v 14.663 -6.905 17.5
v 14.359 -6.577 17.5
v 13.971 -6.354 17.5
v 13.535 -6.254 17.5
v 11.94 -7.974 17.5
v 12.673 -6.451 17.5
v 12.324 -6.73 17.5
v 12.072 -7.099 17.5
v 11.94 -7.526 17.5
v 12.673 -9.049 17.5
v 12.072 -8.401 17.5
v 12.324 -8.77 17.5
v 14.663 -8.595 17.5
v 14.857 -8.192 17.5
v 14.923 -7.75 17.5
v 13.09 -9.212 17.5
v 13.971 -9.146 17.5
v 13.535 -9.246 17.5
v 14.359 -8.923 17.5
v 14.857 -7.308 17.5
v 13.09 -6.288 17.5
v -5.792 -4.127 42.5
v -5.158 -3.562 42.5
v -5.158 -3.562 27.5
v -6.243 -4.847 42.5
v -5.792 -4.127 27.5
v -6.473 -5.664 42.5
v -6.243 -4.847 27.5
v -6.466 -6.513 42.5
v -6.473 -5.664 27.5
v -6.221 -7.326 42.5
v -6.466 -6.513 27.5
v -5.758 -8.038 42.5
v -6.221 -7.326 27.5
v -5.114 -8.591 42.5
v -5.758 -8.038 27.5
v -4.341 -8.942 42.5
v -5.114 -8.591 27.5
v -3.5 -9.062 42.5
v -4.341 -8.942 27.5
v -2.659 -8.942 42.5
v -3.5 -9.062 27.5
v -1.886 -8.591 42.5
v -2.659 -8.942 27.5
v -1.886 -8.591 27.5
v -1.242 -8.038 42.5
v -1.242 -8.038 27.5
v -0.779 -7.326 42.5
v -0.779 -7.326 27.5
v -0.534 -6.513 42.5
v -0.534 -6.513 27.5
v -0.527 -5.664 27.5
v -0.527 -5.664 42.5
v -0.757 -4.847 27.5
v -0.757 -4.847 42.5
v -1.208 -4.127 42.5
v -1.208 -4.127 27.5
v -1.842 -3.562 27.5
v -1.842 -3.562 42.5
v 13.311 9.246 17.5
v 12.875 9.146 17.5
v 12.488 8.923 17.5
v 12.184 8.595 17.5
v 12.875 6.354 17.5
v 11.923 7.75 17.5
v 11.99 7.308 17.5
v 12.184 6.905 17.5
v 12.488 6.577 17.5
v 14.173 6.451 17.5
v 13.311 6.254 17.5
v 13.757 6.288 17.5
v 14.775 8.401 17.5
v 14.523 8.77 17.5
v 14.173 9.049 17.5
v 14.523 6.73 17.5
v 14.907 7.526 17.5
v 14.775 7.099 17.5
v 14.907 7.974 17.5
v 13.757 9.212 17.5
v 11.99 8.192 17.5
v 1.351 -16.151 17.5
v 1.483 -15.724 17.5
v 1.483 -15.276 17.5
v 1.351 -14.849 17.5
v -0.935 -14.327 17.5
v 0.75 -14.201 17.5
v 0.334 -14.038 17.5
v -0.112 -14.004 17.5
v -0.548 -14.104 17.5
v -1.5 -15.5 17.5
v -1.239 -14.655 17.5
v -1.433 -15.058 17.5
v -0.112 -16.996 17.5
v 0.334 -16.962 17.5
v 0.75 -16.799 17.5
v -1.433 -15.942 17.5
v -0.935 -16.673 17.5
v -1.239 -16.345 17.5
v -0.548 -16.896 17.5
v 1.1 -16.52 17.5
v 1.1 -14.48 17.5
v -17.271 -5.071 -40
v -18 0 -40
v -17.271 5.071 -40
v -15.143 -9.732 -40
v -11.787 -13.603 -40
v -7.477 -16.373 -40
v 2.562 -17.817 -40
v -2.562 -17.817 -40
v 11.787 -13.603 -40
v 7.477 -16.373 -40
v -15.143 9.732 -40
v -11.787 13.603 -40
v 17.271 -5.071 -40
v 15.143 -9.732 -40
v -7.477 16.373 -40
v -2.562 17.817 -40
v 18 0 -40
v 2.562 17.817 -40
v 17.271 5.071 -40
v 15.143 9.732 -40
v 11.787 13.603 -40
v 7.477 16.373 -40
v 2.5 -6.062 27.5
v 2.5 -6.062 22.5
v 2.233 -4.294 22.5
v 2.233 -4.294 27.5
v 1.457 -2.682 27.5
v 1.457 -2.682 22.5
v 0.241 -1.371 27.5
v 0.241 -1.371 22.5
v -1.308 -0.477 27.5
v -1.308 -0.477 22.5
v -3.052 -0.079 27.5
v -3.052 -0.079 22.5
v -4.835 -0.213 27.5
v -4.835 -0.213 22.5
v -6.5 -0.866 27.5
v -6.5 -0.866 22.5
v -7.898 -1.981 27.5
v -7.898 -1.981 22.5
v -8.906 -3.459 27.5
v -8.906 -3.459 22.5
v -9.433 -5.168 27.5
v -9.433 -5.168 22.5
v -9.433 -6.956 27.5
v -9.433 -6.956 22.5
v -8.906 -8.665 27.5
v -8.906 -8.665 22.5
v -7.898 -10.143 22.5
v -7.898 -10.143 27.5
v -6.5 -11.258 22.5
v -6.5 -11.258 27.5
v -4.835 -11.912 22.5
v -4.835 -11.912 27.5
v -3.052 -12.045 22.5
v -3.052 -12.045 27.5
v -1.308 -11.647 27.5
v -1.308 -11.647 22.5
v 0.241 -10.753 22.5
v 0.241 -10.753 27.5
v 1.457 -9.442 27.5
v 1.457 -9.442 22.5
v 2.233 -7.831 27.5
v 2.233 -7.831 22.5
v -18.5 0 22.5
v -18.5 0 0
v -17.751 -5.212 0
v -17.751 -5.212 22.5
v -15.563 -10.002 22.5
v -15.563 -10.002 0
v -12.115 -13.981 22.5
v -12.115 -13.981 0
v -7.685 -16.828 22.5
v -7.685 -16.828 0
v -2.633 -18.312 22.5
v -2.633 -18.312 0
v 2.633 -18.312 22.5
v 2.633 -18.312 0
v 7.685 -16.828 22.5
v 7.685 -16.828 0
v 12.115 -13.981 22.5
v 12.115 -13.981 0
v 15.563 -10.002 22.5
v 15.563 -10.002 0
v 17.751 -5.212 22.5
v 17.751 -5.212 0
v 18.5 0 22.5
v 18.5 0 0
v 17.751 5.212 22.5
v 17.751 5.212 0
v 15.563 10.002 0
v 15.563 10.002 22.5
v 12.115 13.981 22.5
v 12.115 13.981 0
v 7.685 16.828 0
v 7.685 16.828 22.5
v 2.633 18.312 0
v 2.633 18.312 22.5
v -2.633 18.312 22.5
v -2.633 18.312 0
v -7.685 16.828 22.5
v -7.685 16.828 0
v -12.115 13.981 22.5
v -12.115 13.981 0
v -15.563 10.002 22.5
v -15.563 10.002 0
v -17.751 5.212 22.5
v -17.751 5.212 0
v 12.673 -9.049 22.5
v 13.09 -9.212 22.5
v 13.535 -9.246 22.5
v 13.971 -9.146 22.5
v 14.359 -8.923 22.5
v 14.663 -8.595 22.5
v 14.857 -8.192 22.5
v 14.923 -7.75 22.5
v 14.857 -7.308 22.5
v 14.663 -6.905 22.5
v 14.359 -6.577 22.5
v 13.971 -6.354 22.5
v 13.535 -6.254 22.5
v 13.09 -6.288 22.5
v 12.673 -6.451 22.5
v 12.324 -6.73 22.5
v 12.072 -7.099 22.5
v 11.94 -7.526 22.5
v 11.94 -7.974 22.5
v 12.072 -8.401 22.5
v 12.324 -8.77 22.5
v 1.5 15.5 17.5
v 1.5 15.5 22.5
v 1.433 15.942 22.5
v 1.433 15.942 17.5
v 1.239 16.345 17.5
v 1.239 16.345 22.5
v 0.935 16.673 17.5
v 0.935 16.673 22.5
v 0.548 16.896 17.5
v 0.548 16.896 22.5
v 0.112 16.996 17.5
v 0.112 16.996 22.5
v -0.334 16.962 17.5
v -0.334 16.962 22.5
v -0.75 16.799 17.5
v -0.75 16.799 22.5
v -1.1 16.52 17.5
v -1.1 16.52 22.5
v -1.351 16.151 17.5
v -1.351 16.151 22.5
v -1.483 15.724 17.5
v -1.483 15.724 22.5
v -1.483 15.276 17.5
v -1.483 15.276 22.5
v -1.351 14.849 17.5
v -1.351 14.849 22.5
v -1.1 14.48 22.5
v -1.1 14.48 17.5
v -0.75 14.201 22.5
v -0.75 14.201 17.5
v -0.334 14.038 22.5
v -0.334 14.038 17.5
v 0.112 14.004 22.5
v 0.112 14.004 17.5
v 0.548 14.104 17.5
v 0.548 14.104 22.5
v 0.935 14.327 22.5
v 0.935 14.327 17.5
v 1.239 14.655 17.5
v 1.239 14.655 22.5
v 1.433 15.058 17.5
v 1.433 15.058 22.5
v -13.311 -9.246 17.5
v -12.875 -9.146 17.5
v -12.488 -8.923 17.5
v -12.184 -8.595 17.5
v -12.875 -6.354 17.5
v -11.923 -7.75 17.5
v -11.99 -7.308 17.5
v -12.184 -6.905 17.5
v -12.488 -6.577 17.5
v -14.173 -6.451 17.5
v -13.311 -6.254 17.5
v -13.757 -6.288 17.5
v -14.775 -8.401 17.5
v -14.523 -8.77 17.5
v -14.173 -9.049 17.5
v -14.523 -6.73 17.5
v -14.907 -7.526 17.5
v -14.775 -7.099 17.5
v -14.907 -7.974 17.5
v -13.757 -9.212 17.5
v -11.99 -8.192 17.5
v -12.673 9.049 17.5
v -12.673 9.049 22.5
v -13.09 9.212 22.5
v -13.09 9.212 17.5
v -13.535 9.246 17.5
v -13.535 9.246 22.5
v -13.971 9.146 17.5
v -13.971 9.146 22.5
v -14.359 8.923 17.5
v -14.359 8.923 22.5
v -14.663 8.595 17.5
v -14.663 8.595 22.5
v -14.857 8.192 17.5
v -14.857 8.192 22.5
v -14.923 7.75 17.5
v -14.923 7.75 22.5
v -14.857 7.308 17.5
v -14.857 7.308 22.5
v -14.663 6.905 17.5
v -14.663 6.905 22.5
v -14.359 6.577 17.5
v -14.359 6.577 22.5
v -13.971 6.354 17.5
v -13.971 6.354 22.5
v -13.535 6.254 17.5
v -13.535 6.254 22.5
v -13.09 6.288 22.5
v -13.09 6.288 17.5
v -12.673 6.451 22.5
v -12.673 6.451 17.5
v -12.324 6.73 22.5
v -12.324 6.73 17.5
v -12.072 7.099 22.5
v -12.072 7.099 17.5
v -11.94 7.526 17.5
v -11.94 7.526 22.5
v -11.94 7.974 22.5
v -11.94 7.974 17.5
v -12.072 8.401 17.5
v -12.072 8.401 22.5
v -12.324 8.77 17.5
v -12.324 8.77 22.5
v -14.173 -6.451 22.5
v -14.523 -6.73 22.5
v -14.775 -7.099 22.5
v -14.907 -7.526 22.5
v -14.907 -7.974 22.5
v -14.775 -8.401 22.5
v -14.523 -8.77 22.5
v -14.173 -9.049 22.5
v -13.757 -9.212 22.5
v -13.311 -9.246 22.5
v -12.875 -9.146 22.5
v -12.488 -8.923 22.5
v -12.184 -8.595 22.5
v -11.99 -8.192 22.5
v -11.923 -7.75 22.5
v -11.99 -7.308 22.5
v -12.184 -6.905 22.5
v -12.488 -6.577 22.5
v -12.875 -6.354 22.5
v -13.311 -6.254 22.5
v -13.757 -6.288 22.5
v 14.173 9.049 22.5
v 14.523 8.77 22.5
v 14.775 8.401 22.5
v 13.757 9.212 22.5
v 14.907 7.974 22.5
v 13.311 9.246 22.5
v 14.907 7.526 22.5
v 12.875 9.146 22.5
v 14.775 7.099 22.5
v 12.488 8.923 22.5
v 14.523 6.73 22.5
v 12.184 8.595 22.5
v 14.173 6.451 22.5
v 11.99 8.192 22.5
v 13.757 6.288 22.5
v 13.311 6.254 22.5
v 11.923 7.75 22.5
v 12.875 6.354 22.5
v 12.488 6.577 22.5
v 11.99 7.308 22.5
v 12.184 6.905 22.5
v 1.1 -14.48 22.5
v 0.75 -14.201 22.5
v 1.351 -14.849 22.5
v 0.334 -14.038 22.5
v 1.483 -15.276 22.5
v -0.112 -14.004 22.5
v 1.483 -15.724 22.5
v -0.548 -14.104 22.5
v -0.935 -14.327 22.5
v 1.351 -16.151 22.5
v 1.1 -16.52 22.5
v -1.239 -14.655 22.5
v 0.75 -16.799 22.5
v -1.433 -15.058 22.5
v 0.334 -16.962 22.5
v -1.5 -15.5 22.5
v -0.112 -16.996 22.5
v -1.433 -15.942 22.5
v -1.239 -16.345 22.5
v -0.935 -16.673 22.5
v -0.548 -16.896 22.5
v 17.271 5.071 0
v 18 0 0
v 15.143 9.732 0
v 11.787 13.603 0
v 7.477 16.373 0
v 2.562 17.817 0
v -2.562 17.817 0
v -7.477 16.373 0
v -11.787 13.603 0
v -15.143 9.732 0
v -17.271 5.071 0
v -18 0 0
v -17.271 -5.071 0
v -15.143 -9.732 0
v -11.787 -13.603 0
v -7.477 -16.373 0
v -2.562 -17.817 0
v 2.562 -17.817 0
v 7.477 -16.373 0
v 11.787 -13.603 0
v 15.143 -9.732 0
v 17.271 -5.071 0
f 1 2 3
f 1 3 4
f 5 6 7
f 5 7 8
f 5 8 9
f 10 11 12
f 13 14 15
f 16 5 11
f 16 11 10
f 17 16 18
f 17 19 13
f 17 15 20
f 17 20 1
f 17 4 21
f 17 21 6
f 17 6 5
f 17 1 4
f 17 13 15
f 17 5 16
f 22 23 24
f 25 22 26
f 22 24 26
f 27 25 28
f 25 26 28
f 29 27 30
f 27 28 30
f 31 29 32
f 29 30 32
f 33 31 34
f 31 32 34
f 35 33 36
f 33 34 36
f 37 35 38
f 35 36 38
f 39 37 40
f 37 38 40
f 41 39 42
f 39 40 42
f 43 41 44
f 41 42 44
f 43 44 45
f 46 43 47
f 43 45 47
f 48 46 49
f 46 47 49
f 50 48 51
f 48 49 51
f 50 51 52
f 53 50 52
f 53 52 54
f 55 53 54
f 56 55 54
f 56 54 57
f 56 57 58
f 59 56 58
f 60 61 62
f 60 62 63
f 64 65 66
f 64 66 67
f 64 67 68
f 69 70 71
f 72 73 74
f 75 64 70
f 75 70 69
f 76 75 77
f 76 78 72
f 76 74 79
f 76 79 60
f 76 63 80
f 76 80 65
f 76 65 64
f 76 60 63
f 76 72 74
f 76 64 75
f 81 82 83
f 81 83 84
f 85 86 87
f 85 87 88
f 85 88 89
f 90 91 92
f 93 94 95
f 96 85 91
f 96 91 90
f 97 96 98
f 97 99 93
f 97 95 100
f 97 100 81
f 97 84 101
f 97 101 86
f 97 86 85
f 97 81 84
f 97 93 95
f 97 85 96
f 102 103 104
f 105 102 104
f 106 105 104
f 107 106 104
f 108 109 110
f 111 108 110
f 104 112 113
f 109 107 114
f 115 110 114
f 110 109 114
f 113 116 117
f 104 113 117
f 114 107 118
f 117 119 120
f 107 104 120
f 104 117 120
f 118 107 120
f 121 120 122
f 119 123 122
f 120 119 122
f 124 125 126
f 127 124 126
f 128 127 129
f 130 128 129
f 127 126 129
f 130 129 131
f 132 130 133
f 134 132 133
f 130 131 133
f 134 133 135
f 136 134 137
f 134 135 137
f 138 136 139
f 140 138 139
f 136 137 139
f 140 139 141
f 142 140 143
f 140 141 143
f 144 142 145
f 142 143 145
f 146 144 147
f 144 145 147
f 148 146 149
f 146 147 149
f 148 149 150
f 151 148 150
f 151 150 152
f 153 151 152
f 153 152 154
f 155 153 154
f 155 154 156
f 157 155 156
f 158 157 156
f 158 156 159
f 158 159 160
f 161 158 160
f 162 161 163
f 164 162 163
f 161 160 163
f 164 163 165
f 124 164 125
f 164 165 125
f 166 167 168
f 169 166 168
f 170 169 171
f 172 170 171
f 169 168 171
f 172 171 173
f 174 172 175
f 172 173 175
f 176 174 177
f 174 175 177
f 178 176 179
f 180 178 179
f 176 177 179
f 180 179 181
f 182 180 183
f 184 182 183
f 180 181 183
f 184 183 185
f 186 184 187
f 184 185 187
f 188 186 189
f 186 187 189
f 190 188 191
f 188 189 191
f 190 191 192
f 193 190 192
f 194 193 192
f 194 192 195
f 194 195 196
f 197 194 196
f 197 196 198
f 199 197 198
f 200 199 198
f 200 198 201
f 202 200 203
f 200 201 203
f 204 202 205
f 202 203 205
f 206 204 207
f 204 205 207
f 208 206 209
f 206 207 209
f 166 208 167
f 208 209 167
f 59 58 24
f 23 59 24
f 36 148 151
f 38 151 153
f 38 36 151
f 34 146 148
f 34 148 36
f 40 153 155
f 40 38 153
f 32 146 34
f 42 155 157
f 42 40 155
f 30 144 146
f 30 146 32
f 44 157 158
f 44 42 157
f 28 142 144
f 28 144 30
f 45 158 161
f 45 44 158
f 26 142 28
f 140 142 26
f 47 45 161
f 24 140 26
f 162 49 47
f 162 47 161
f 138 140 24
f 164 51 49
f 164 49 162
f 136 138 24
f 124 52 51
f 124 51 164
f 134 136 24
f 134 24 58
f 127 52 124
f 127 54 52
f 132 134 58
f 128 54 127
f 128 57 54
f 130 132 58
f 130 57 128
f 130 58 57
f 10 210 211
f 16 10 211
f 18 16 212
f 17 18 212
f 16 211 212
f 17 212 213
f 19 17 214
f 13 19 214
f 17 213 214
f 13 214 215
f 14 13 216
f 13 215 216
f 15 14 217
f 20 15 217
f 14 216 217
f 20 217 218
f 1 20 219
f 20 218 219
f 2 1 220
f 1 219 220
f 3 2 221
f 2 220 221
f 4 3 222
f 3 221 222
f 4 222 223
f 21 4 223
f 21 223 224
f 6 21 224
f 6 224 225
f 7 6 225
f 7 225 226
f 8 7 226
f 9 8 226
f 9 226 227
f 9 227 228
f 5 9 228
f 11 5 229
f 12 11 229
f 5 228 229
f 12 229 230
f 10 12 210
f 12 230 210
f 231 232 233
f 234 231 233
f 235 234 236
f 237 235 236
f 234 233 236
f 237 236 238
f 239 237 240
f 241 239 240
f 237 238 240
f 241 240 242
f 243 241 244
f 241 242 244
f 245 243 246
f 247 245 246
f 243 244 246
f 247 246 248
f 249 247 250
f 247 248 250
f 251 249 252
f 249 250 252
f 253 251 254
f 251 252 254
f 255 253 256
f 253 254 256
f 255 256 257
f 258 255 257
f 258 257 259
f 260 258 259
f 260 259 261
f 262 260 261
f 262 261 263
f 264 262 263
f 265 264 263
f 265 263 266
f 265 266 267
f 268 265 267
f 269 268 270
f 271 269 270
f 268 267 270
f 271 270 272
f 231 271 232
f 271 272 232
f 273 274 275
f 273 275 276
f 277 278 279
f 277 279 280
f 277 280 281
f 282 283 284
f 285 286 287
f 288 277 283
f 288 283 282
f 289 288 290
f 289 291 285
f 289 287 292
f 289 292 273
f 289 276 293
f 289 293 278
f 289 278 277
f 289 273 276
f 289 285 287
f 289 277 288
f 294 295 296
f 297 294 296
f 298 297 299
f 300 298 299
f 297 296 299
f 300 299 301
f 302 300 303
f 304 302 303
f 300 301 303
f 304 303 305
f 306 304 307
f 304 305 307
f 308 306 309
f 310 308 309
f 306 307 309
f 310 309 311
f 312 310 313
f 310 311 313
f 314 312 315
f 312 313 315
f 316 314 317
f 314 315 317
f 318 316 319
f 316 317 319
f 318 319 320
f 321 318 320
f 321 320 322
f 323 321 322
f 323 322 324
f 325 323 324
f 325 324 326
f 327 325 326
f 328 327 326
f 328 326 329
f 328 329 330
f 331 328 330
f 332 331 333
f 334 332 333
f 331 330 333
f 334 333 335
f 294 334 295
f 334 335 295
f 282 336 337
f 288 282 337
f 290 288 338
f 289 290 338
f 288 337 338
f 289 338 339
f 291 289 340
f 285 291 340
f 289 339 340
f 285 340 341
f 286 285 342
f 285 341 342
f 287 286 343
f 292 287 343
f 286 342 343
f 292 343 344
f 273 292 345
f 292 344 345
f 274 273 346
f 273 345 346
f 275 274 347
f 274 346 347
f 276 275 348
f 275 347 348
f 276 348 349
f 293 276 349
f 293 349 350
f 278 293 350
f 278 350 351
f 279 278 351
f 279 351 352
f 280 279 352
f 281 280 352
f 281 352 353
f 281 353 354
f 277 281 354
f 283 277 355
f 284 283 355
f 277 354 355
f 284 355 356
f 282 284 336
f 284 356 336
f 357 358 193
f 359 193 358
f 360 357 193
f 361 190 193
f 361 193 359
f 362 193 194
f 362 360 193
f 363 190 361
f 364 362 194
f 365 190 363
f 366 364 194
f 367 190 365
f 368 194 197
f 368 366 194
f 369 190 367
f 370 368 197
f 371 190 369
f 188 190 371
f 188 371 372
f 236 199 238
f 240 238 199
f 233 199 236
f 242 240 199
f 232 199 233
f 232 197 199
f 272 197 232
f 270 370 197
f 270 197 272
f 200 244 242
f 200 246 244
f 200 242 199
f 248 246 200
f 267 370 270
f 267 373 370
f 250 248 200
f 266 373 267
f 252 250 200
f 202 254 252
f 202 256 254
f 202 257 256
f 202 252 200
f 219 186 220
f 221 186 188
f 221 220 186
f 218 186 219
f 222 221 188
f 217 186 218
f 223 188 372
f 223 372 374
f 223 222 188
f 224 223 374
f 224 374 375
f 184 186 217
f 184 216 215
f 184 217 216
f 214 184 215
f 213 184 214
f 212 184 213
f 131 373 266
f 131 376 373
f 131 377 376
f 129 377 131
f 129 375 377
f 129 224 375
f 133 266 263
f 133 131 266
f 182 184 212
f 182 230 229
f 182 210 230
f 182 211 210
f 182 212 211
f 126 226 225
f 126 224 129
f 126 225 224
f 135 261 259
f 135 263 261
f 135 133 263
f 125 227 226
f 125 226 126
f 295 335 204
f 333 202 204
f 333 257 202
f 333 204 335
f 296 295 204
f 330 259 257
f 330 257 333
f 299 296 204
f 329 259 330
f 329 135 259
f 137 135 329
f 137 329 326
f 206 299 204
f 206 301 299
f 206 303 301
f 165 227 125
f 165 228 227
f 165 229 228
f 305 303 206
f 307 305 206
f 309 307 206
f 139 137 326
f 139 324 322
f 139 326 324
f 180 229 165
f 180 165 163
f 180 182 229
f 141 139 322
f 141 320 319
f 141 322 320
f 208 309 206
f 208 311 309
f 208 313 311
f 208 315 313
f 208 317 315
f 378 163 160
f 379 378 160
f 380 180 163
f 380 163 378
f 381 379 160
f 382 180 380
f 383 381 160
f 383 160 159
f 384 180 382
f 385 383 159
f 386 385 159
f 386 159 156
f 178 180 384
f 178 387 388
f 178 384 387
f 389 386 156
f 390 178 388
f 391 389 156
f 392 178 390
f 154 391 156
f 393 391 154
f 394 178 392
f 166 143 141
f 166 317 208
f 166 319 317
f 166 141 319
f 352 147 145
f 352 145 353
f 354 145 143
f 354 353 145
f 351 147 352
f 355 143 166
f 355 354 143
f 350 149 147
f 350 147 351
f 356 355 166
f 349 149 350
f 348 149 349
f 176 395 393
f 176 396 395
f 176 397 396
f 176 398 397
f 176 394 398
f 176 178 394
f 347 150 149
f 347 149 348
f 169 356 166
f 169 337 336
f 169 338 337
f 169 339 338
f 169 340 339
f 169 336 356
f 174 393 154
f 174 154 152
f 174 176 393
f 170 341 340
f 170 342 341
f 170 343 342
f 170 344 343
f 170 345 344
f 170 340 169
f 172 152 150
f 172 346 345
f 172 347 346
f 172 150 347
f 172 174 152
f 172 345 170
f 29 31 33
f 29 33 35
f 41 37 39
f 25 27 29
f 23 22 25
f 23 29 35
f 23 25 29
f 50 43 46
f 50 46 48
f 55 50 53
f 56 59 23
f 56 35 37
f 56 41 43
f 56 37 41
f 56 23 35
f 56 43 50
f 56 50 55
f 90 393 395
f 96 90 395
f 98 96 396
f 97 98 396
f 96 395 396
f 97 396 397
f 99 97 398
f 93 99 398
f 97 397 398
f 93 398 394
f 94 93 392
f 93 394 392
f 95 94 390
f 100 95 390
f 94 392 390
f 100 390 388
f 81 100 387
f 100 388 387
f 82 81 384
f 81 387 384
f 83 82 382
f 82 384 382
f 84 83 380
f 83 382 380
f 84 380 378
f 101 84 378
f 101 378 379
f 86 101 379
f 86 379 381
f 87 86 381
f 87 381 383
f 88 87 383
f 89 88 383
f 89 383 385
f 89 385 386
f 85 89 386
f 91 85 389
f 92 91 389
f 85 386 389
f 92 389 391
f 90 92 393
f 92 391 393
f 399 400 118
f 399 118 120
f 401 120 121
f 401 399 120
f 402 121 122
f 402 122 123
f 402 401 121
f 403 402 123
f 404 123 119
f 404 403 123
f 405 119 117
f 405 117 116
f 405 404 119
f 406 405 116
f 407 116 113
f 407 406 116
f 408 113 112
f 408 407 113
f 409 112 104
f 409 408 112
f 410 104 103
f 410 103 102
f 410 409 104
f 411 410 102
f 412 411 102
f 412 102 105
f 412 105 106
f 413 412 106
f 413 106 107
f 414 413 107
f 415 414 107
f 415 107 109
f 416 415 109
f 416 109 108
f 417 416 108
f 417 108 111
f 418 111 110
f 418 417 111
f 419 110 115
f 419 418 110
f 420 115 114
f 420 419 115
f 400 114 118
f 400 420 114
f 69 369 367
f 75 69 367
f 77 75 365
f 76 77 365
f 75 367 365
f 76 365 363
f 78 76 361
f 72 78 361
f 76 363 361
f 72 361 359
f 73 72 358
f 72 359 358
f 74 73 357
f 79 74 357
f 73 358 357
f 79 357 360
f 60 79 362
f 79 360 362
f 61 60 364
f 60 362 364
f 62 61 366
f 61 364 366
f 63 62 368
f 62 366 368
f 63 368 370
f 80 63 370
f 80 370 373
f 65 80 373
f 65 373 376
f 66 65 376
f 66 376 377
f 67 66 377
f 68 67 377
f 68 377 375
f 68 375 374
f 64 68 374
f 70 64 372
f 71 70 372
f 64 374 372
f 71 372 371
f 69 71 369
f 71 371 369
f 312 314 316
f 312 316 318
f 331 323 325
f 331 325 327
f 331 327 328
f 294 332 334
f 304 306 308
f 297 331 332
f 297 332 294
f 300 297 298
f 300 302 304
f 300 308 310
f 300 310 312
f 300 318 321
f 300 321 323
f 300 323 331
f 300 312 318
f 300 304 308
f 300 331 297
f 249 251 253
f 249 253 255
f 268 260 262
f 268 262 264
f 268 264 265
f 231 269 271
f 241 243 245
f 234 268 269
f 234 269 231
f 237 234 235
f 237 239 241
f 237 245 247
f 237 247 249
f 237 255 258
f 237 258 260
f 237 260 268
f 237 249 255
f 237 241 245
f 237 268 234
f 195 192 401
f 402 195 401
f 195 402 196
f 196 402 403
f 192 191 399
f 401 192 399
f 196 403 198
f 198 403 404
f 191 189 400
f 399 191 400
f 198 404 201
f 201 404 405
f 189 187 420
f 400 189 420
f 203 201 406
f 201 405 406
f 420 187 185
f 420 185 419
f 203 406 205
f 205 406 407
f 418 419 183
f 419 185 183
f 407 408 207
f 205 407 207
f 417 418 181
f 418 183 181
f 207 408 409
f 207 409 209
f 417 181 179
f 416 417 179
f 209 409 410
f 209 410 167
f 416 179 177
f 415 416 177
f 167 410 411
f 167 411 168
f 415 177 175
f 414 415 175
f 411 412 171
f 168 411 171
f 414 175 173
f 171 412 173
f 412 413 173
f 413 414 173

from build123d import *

# Parameters (mm, degrees)
SKETCH_1_R               = 18
EXTRUDE_1_DEPTH          = 40
SKETCH_2_R               = 18.5
EXTRUDE_2_DEPTH          = 22.5
SKETCH_3_R               = 6
EXTRUDE_3_DEPTH          = 5
EXTRUDE_4_DEPTH          = 20
SKETCH_5_R               = 1.5
CUT_EXTRUDE_1_DEPTH      = 5
PATTERN_CIRCULAR_1_COUNT = 6


with BuildPart() as part:
    # 草图1 → 凸台-拉伸1 (new body)
    with BuildSketch(Plane.XY):
        Circle(SKETCH_1_R)
    extrude(amount=-EXTRUDE_1_DEPTH)

    # 草图2 → 凸台-拉伸2 (add)
    with BuildSketch(Plane.XY):
        with Locations(Location((0, 0, 0), (0, 0, 180))):
            Circle(SKETCH_2_R)
    extrude(amount=EXTRUDE_2_DEPTH)

    # 草图3 → 凸台-拉伸3 (add)
    with BuildSketch(Plane.XY.offset(22.5)):
        with Locations((-3.5, -6.062177826)):
            Circle(SKETCH_3_R)
    extrude(amount=EXTRUDE_3_DEPTH)

    # 草图4 → 凸台-拉伸4 (add)
    with BuildSketch(Plane.XY.offset(22.5)):
        with BuildLine():
            Line((-1.841687605, -3.562177826), (-5.158312395, -3.562177826))
            ThreePointArc((-5.158312395, -3.562177826), (-3.5, -9.062177826), (-1.841687605, -3.562177826))
        make_face()
    extrude(amount=EXTRUDE_4_DEPTH)

    # 草图5 → 切除-拉伸1 (cut)
    with BuildSketch(Plane.XY.offset(22.5)):
        with Locations((0, 15.5)):
            Circle(SKETCH_5_R)
    cut_extrude_1 = extrude(amount=-CUT_EXTRUDE_1_DEPTH, mode=Mode.SUBTRACT)

    # 阵列(圆周)1: 切除-拉伸1 ×6 about axis
    pattern_circular_1_axis = Axis((0, 0, 0), (0, 0, 1))
    for i in range(1, PATTERN_CIRCULAR_1_COUNT):
        add(cut_extrude_1.rotate(pattern_circular_1_axis, i * 360 / PATTERN_CIRCULAR_1_COUNT), mode=Mode.SUBTRACT)


solid = part.part
